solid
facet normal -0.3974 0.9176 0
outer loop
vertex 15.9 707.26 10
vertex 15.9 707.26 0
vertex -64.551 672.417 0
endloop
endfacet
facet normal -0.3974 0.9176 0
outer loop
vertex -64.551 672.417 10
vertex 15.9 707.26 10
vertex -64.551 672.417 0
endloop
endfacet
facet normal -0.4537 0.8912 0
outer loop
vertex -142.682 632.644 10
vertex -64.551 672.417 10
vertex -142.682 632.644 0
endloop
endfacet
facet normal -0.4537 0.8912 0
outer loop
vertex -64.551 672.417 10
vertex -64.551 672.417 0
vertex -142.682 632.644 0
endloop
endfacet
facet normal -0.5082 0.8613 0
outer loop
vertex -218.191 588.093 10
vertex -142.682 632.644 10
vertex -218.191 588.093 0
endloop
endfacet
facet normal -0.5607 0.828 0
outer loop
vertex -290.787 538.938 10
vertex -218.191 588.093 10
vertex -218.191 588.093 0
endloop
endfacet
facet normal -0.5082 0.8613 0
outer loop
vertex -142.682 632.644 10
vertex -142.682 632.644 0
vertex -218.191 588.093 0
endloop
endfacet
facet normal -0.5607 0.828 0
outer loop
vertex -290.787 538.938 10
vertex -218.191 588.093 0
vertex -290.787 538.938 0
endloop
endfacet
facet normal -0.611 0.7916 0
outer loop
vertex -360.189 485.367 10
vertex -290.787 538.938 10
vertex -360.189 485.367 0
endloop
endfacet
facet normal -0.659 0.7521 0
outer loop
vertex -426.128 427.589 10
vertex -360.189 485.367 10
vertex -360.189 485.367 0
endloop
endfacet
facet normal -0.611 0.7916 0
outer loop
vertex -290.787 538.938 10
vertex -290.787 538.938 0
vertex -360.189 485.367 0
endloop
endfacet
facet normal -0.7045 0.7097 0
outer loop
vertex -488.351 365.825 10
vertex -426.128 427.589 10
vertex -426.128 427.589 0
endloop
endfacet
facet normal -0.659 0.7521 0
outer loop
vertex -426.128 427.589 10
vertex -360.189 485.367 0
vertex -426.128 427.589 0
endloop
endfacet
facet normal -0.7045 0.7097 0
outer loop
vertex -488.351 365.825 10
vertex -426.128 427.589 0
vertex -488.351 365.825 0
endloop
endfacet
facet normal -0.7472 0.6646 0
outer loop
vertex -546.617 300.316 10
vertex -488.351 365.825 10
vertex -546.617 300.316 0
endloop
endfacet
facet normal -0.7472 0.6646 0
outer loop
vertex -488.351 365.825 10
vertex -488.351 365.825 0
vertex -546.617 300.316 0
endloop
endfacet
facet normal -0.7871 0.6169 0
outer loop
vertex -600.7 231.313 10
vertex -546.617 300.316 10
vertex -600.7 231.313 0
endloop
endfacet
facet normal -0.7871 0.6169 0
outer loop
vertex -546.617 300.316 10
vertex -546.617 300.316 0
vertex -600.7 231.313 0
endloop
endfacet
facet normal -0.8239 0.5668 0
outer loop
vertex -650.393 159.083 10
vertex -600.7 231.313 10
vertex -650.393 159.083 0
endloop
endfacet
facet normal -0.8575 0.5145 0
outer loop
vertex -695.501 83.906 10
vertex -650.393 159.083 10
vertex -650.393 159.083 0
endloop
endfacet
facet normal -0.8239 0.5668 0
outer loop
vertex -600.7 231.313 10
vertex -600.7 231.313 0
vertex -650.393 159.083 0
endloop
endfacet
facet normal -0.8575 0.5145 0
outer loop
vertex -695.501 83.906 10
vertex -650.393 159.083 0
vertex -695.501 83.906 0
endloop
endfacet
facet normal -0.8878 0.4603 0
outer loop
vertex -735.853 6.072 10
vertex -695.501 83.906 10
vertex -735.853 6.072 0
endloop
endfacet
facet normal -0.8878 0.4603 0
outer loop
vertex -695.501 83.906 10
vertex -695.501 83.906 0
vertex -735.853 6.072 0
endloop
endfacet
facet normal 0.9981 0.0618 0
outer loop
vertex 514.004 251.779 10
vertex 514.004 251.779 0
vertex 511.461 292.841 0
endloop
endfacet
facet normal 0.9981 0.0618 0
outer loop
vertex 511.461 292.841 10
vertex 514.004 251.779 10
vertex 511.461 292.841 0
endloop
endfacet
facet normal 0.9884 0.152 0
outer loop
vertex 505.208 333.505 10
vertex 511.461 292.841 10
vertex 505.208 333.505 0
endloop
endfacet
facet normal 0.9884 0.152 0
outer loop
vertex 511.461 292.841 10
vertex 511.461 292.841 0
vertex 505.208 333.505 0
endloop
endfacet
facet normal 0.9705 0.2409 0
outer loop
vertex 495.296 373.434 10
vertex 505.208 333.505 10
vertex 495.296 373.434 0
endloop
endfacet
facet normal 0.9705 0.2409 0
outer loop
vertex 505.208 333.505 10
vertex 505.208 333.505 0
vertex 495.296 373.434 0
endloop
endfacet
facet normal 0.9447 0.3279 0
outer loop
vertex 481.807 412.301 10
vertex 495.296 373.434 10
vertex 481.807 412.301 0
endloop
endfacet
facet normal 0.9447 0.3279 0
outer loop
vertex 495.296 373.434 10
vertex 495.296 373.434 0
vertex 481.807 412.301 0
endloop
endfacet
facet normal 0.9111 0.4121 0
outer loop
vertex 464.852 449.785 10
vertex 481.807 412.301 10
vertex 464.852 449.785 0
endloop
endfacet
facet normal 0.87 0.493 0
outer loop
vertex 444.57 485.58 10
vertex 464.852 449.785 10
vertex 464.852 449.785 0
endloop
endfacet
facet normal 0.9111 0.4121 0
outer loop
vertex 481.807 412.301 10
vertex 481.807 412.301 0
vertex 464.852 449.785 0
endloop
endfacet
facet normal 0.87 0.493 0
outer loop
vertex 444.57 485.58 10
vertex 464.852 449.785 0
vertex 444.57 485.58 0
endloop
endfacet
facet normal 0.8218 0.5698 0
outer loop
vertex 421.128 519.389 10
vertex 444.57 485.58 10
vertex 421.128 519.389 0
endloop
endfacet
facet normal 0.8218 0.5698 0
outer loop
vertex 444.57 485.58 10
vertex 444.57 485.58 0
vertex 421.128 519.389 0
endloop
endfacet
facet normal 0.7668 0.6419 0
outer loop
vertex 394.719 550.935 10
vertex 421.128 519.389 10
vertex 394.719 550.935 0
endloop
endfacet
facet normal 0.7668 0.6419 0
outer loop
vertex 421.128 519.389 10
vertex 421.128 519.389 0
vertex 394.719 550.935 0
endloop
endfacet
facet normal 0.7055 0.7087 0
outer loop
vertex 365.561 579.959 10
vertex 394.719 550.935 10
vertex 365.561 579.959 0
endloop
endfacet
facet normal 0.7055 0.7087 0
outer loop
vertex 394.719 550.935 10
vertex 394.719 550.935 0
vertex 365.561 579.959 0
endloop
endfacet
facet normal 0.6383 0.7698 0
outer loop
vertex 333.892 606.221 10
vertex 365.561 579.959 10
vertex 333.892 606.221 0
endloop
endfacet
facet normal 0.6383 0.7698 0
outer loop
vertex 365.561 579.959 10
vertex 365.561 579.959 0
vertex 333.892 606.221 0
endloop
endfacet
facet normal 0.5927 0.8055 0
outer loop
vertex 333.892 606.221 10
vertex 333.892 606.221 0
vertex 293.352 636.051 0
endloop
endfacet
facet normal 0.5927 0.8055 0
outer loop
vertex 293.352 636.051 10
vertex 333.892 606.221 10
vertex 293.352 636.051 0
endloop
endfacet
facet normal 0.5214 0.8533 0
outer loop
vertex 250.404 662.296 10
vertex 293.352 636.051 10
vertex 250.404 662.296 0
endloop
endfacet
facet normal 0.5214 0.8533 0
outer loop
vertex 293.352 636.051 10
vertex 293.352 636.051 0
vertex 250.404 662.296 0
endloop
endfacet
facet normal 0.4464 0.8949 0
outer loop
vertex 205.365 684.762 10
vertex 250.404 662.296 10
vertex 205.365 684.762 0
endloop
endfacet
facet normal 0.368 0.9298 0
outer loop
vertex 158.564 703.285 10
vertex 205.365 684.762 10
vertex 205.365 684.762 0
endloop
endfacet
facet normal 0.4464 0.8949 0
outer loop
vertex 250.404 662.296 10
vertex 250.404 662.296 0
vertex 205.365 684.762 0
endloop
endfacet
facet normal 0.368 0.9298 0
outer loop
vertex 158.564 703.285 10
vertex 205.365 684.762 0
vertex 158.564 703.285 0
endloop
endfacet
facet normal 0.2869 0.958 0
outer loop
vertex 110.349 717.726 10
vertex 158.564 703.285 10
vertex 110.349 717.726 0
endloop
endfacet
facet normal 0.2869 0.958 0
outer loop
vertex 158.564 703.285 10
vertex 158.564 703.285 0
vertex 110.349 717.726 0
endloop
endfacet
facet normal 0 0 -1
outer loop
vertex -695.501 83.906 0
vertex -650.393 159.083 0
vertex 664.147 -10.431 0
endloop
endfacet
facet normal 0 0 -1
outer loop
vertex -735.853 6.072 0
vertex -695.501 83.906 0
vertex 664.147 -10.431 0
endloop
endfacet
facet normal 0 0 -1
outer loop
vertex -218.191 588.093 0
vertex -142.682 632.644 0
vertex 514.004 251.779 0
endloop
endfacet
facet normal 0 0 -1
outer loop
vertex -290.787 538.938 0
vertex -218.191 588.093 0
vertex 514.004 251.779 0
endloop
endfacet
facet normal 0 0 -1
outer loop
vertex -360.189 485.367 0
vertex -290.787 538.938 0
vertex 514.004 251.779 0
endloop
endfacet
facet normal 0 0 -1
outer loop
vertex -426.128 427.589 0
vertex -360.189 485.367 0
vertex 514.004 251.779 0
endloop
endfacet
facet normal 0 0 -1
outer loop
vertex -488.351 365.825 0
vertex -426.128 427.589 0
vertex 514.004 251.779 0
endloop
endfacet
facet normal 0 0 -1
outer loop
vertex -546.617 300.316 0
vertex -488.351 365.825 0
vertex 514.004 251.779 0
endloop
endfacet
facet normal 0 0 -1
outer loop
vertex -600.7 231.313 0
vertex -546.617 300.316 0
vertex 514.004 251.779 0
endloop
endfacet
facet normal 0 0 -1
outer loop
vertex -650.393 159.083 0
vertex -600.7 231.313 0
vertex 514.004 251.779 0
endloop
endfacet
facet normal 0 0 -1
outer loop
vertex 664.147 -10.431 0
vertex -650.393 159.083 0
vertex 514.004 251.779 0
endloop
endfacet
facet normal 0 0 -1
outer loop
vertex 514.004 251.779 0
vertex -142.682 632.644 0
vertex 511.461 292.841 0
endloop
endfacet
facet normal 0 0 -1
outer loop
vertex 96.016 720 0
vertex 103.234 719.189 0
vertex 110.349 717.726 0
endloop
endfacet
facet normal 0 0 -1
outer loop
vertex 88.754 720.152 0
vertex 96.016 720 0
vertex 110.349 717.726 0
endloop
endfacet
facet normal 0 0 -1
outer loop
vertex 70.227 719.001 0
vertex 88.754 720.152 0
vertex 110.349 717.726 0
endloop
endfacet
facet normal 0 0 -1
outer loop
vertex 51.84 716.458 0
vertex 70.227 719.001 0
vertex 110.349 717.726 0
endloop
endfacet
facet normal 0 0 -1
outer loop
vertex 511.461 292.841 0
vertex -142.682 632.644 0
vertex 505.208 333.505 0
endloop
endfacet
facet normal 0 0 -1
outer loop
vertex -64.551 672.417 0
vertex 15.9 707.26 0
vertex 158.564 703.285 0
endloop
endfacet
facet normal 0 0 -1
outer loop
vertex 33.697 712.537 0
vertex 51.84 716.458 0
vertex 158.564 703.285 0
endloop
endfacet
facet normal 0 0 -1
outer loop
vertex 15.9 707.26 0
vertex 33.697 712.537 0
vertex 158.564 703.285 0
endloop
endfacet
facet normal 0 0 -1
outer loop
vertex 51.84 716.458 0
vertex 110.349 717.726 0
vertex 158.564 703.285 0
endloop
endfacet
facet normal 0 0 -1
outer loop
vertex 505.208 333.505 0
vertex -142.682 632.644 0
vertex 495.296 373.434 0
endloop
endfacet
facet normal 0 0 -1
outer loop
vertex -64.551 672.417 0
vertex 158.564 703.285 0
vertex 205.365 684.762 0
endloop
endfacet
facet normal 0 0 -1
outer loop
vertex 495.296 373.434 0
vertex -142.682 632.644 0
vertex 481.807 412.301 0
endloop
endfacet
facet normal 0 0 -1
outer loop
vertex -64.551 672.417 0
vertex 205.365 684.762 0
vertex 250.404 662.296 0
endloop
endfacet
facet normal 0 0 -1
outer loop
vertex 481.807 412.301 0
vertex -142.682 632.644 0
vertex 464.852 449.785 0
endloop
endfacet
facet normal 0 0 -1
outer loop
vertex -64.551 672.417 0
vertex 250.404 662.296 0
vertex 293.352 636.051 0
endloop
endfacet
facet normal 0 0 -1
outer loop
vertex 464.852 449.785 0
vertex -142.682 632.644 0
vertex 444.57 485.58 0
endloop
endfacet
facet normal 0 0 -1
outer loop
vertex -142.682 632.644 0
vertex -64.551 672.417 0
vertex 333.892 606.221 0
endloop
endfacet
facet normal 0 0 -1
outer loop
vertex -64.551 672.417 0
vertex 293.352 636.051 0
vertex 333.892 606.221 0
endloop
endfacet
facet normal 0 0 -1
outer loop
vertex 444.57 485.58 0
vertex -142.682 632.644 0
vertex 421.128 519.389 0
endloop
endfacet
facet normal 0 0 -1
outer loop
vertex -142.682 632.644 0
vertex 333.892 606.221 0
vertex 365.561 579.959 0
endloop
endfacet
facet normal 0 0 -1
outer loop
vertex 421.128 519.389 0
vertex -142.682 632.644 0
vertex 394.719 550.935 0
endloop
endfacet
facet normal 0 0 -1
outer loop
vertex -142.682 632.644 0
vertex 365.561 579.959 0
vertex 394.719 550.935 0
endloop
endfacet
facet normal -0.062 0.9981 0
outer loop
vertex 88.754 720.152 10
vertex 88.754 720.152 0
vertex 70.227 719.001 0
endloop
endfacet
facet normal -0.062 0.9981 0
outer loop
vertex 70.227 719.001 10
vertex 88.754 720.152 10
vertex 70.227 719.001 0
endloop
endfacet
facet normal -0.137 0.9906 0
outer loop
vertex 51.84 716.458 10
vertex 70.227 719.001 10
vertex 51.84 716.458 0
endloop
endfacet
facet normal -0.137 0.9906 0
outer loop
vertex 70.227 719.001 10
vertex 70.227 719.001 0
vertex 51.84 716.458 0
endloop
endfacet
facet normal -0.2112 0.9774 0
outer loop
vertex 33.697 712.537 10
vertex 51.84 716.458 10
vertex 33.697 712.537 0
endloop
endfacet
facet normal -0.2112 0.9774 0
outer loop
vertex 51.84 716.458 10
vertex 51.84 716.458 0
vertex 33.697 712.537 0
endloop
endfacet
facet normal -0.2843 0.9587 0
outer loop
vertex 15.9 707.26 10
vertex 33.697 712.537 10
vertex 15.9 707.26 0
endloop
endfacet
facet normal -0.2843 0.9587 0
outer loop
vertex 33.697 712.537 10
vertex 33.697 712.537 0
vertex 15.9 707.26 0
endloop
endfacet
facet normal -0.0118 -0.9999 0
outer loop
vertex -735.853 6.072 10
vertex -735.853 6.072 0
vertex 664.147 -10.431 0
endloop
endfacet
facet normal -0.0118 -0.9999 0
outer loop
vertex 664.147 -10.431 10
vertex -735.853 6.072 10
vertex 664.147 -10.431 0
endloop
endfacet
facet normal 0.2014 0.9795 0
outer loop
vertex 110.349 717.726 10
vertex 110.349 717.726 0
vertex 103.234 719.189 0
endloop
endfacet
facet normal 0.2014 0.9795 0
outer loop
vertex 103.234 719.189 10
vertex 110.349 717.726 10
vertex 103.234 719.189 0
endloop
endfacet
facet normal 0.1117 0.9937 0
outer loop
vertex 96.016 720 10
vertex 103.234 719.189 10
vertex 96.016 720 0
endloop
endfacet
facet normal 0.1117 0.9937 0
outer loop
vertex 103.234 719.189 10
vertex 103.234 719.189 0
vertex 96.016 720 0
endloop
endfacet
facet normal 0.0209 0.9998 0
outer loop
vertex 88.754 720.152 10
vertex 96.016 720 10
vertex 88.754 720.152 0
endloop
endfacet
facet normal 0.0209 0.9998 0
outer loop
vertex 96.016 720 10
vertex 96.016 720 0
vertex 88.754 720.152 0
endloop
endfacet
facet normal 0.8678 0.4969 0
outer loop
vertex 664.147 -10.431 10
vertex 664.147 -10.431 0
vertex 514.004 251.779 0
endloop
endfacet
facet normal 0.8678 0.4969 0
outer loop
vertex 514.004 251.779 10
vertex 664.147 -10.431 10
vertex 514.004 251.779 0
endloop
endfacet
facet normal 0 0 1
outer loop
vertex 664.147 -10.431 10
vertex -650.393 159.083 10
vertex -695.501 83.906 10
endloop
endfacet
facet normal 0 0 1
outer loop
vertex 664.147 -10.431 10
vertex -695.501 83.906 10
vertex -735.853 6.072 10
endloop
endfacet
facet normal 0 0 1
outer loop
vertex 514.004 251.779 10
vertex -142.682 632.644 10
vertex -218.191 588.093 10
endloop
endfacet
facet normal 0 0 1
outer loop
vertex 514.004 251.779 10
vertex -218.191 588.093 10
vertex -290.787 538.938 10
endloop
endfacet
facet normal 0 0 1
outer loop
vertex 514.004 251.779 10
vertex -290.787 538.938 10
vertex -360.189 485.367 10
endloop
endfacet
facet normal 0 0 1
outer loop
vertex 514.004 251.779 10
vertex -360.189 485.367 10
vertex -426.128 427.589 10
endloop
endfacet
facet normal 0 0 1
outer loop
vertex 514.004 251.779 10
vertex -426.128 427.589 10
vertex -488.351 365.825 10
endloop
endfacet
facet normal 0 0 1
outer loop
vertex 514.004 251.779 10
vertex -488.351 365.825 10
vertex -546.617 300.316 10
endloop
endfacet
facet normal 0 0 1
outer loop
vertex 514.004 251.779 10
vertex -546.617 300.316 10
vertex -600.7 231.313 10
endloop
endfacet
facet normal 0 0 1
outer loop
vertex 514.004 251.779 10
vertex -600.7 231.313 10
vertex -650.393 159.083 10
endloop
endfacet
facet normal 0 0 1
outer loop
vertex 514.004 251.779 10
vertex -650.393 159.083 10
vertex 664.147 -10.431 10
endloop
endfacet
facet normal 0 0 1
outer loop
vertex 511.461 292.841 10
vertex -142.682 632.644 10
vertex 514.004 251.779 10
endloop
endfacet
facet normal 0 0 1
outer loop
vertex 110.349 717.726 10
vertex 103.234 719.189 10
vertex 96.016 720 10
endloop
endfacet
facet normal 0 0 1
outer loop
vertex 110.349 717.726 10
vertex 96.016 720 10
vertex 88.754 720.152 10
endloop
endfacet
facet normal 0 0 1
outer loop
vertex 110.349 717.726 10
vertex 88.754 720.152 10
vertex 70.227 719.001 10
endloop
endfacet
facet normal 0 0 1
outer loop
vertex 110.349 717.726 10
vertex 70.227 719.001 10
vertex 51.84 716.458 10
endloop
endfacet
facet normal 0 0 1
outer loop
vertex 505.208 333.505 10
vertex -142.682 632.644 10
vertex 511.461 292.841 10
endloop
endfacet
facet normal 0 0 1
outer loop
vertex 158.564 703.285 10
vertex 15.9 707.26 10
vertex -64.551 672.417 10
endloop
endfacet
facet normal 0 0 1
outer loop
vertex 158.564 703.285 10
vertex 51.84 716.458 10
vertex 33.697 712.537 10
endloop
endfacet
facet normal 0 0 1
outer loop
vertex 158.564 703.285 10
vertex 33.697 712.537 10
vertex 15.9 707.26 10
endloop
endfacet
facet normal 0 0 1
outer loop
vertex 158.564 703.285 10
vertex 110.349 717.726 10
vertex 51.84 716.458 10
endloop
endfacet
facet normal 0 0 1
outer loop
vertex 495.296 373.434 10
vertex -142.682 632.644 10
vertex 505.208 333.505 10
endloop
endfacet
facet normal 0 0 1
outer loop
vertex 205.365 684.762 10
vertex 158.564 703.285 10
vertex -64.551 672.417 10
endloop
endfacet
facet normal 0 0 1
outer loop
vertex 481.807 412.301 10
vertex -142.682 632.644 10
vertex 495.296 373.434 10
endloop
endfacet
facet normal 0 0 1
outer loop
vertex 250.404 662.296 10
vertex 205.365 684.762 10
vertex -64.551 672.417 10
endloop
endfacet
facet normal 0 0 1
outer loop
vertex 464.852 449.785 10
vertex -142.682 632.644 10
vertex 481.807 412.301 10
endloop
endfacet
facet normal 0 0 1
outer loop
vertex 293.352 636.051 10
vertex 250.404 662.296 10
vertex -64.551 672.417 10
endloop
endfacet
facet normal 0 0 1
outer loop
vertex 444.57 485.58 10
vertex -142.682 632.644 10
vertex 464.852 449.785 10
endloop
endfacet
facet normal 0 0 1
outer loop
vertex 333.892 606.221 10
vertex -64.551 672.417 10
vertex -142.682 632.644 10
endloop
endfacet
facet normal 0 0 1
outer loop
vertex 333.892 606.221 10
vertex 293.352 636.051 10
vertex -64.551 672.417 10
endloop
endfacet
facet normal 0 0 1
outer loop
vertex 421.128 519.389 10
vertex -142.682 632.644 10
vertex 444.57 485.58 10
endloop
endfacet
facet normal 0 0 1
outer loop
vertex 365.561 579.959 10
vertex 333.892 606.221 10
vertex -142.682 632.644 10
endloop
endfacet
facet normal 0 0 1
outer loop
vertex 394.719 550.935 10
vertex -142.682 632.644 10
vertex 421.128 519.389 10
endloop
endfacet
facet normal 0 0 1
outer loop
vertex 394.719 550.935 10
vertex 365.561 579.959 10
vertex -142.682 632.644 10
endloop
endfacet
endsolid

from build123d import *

# Parameters (mm, degrees)
Y_KSEKLIK_EKSTR_ZYON1_DEPTH = 10


with BuildPart() as part:
    # Çizim1 → Yükseklik-Ekstrüzyon1 (new body)
    with BuildSketch(Plane.XY):
        with BuildLine():
            ThreePointArc((15.900247885, 707.260051266), (-426.128478979, 427.588769164), (-735.852954334, 6.072256116))
            Line((-735.852954334, 6.072256116), (664.147045666, -10.43069172))
            Line((664.147045666, -10.43069172), (514.004259651, 251.779036937))
            ThreePointArc((514.004259651, 251.779036937), (464.852209342, 449.785422775), (333.892309545, 606.22057716))
            ThreePointArc((333.892309545, 606.22057716), (228.125604356, 674.012353772), (110.348718239, 717.726493351))
            ThreePointArc((110.348718239, 717.726493351), (99.634050041, 719.676084087), (88.753877168, 720.152379041))
            ThreePointArc((88.753877168, 720.152379041), (51.840168654, 716.457617872), (15.900247885, 707.260051266))
        make_face()
    extrude(amount=Y_KSEKLIK_EKSTR_ZYON1_DEPTH)


solid = part.part
